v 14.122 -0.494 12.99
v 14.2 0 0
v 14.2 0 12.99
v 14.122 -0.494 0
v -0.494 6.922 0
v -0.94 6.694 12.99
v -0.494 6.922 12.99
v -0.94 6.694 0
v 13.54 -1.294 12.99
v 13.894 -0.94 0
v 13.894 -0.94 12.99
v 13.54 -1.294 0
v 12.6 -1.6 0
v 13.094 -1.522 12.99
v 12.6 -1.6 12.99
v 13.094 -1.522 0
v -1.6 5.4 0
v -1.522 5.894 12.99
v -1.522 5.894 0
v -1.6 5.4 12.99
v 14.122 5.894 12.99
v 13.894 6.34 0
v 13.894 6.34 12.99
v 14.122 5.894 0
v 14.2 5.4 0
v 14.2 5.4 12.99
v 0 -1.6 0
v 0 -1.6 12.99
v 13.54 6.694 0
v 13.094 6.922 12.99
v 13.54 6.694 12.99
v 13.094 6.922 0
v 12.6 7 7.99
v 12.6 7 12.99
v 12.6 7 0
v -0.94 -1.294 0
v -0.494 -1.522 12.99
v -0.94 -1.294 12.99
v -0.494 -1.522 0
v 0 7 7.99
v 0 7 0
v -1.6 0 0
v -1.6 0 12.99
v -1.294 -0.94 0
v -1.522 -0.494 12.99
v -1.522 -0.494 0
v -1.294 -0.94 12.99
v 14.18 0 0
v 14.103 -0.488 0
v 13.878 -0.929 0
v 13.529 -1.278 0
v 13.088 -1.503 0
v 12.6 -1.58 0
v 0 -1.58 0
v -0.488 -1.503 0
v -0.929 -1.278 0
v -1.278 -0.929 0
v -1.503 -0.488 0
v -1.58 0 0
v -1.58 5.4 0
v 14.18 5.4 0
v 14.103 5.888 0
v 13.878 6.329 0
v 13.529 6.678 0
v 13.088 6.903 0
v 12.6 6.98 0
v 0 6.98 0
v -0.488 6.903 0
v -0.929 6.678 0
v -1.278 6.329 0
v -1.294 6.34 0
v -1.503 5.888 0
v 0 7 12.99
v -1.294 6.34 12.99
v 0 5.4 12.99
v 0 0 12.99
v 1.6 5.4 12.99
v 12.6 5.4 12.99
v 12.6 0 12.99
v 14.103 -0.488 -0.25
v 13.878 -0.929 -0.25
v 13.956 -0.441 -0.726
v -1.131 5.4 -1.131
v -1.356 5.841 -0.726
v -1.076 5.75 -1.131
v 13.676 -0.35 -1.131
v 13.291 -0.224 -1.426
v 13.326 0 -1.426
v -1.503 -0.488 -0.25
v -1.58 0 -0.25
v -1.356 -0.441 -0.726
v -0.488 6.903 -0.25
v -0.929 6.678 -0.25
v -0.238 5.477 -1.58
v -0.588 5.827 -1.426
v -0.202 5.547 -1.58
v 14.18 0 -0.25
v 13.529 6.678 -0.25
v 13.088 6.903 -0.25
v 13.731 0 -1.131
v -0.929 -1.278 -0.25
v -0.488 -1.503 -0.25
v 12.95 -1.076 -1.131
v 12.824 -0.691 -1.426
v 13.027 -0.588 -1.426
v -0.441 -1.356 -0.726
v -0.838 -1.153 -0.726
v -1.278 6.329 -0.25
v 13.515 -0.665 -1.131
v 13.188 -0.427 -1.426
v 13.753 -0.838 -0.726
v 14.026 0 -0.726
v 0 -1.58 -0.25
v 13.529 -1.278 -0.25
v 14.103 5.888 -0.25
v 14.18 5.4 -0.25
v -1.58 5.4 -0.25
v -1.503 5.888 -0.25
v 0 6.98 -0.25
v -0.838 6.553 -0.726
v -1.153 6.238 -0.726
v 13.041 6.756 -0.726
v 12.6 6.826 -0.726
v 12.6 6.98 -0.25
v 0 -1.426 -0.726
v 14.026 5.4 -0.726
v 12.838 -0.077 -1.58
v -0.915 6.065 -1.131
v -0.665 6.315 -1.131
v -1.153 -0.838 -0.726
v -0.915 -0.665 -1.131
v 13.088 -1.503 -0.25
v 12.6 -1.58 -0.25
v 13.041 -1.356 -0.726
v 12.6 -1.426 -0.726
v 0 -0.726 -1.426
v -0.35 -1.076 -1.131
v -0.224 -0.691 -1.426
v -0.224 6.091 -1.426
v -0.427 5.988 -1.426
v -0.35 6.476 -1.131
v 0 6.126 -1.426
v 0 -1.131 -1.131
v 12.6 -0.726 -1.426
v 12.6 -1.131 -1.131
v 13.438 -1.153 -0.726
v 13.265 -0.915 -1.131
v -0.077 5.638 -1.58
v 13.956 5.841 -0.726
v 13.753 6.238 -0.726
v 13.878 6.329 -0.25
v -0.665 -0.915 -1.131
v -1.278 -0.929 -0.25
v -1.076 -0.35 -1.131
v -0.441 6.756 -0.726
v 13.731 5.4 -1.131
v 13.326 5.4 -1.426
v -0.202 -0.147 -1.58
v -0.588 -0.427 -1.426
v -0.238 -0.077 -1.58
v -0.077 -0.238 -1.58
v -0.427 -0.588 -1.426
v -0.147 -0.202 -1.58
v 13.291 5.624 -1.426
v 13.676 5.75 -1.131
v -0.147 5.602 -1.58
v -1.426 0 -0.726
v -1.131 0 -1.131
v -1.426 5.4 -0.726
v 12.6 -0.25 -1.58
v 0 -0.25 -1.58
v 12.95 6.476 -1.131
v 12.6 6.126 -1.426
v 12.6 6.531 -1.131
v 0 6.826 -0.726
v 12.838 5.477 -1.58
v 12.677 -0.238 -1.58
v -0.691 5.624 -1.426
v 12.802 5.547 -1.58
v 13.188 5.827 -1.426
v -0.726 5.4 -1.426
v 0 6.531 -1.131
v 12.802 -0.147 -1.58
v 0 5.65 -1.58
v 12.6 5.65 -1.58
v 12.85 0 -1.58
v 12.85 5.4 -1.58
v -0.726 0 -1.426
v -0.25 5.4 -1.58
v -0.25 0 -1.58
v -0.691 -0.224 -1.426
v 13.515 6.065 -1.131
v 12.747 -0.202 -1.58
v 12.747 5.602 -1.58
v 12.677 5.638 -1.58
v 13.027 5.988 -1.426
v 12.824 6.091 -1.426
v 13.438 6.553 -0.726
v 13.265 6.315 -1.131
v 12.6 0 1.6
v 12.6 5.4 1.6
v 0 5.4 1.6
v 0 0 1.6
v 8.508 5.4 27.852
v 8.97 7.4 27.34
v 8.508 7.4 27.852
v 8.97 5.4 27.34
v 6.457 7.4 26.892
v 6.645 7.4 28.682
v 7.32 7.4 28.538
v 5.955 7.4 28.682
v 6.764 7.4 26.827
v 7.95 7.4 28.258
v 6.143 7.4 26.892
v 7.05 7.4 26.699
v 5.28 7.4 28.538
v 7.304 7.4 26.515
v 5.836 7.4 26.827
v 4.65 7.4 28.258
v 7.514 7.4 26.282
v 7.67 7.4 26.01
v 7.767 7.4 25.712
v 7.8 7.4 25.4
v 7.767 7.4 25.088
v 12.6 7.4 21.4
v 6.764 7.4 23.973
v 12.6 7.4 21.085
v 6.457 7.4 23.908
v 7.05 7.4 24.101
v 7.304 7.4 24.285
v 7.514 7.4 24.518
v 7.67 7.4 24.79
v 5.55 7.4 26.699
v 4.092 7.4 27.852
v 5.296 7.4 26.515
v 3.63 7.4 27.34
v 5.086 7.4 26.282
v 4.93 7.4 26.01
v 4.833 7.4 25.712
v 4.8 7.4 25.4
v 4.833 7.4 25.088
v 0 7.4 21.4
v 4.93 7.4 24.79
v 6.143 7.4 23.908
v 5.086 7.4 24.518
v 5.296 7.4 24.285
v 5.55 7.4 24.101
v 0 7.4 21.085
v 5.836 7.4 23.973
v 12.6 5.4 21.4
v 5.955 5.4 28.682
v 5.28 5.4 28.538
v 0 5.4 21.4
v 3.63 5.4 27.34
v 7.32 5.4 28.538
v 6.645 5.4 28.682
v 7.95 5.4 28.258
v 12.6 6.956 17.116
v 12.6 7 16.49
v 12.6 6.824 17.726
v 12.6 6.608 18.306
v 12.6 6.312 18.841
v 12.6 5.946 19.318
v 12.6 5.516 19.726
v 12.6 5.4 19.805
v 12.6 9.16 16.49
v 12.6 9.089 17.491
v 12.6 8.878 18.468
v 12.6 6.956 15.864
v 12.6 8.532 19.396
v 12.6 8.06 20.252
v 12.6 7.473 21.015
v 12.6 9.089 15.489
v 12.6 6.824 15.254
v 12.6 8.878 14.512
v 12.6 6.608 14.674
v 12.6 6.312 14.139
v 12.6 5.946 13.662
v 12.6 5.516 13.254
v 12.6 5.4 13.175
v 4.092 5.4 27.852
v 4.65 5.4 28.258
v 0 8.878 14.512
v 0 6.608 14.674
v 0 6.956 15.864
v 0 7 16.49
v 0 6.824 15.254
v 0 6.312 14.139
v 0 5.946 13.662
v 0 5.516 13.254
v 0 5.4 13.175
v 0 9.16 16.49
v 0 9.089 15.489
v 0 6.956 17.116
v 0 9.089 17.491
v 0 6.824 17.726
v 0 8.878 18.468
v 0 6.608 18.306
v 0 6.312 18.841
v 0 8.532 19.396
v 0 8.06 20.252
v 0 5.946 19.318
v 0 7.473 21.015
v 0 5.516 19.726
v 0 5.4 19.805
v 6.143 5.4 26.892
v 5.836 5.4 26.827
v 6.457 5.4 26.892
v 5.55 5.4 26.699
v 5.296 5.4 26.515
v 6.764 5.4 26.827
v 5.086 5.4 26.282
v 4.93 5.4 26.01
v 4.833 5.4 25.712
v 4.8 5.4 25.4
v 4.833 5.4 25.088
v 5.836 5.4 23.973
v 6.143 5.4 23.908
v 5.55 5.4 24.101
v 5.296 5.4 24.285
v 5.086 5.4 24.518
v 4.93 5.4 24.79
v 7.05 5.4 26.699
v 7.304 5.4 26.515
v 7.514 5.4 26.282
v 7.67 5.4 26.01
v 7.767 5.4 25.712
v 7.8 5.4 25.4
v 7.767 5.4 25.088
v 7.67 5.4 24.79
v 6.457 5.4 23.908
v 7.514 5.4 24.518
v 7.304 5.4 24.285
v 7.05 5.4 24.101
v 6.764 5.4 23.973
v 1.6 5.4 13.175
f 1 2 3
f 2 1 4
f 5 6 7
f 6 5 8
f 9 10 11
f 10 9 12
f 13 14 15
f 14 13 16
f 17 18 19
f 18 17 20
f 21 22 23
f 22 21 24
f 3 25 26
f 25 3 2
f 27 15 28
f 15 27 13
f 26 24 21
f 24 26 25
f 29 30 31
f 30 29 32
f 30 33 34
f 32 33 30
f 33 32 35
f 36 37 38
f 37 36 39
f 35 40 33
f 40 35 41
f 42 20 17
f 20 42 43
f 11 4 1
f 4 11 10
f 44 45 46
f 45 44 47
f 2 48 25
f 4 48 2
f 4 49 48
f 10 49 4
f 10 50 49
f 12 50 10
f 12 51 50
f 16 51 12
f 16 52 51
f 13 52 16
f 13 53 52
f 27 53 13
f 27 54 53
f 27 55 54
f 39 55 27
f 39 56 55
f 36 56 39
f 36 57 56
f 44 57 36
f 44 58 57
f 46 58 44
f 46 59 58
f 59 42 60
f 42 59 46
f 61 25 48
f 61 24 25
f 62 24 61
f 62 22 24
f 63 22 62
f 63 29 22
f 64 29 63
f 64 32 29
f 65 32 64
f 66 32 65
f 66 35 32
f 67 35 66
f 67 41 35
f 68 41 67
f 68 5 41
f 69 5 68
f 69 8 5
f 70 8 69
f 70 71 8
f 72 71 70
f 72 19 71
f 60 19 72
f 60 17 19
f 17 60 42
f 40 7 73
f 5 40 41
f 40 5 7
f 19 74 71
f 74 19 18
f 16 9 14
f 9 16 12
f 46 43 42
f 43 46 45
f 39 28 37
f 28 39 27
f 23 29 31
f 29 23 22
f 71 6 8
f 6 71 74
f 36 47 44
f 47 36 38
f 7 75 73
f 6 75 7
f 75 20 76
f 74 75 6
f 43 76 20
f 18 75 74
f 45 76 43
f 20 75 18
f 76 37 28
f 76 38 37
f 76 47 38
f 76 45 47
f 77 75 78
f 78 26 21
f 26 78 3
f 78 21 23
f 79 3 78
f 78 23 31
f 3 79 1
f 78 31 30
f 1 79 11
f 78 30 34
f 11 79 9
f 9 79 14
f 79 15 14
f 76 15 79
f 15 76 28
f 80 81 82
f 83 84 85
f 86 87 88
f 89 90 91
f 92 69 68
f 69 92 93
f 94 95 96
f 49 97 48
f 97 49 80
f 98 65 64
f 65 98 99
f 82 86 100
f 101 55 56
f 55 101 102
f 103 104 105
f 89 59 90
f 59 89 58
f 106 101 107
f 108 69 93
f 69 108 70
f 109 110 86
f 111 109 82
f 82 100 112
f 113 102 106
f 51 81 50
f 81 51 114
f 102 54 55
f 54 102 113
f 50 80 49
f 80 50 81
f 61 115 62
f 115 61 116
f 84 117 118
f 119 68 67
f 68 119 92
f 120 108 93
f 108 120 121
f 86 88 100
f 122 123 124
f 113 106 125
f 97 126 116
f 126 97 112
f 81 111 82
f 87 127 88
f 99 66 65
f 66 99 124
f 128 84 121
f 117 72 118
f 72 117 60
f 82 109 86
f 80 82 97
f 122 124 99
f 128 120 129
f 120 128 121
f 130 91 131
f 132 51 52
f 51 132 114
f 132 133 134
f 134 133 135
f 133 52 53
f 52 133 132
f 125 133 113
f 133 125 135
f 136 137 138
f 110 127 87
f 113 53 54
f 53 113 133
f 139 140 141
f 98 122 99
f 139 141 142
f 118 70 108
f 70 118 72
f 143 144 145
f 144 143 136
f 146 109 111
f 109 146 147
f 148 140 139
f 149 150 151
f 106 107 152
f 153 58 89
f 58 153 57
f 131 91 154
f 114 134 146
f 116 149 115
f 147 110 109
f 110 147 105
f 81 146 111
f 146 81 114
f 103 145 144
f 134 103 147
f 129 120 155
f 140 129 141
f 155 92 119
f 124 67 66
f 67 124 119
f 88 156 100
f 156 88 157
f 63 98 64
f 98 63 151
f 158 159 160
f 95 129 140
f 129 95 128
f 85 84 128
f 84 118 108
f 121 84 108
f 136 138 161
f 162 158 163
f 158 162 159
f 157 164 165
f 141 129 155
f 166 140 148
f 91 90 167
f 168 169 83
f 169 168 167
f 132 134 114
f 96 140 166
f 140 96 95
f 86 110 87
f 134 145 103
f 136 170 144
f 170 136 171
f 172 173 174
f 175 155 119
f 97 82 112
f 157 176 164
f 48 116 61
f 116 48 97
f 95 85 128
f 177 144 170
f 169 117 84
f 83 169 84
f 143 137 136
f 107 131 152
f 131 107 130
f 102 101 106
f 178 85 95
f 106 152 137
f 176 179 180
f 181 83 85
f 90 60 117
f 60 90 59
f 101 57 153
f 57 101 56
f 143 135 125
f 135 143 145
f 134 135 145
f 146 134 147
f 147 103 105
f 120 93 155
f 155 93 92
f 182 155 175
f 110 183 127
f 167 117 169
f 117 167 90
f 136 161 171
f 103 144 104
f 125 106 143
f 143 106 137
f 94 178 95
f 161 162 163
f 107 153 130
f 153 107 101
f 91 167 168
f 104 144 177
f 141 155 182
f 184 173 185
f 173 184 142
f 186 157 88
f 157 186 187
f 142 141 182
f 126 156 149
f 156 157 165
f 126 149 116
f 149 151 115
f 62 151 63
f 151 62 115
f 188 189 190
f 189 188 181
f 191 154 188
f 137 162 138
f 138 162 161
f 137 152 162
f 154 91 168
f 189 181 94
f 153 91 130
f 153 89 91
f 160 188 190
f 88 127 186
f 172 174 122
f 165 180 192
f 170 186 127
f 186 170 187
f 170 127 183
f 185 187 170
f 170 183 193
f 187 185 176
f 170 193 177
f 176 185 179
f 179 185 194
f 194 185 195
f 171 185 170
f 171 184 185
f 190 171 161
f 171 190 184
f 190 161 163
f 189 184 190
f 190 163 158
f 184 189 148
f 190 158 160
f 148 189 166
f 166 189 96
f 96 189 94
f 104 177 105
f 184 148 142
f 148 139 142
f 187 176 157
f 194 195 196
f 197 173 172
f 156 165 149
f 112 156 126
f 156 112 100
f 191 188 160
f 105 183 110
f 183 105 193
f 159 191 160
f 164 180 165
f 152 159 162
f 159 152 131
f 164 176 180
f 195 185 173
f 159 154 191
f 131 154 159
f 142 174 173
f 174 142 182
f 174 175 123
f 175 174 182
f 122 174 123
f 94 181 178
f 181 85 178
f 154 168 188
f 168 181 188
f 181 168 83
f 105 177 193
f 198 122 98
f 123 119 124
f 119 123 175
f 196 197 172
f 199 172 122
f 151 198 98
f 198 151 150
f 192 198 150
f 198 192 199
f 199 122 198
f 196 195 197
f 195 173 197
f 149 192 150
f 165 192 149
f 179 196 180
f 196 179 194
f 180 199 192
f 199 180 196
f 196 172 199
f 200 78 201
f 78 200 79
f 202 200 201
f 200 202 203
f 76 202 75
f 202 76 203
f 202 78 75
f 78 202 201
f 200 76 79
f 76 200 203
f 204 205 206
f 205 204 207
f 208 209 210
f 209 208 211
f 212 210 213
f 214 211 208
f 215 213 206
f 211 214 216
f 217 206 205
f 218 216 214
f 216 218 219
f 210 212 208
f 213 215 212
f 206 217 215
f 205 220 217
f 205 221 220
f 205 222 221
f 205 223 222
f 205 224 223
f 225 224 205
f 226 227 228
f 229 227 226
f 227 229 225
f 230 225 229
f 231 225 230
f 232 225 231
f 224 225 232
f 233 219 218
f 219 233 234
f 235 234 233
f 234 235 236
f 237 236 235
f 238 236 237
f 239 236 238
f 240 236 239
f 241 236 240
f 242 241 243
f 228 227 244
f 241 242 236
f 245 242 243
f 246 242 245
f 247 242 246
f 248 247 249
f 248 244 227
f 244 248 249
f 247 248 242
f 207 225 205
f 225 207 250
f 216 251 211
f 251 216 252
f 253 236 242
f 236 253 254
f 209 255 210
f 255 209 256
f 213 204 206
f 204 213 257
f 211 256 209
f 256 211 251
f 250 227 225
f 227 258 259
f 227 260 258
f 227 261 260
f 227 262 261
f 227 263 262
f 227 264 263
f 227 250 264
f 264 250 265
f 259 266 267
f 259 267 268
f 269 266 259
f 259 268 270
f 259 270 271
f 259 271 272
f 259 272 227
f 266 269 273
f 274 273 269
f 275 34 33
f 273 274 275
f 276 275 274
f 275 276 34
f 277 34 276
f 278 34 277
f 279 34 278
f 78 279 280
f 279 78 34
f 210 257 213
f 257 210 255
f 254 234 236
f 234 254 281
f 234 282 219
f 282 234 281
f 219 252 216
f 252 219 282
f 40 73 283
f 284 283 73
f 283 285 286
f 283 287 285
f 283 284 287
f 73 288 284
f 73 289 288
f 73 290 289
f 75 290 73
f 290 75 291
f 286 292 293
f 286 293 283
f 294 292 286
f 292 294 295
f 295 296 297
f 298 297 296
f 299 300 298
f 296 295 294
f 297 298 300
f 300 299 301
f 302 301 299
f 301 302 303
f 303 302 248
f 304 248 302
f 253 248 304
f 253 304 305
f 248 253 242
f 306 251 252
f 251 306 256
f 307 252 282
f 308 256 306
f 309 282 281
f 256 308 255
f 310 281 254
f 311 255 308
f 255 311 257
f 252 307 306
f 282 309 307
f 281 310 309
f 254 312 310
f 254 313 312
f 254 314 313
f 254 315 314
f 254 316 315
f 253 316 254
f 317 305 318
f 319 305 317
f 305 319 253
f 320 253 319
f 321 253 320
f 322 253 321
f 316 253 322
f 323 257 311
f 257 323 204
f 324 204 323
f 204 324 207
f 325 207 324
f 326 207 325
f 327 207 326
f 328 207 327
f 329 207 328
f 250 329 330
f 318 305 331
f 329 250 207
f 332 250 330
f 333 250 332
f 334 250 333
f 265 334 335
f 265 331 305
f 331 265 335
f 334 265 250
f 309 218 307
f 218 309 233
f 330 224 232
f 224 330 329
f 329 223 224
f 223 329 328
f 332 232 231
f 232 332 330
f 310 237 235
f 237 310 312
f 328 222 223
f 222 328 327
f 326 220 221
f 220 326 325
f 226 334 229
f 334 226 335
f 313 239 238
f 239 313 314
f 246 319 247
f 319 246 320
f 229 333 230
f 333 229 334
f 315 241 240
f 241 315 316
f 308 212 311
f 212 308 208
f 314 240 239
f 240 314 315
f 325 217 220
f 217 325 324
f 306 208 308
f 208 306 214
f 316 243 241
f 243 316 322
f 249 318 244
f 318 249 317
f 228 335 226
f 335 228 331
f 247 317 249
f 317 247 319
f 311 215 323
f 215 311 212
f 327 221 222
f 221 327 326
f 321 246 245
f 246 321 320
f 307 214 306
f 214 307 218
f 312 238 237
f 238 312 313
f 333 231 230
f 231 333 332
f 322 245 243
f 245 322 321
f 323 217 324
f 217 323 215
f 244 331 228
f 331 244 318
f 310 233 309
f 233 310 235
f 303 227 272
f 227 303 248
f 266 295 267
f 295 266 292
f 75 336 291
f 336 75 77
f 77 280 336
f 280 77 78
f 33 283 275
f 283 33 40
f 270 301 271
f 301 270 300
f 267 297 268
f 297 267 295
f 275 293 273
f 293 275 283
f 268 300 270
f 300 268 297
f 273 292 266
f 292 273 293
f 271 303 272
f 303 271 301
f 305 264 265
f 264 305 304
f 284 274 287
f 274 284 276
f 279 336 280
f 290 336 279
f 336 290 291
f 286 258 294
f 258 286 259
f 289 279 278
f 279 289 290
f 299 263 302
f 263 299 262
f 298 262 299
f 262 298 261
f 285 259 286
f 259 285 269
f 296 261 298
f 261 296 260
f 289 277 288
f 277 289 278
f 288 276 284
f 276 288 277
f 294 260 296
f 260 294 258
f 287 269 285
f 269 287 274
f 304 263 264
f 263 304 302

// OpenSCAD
thick=1.6;
main_arr=[12.6,5.4,11.4];
difference() {
  minkowski() {
    cube(main_arr);
    union(){
    cylinder(r=thick,h=thick-.01,$fn=20);
    sphere(r=thick,$fn=20);
    }
  }
  translate([0,0,thick]) cube(main_arr);
}
*translate([main_arr[0]/2-3,0,main_arr[2]+thick-.01]) {
  cube([6,thick,10]);
  translate([0,0,8]) cube([6,thick+.5,2]);
}
translate([0,main_arr[1],main_arr[2]+9]) difference() {
  hull() {
    translate([0,0]) cube([main_arr[0],2,1]);
    translate([main_arr[0]/2,0,5]) rotate([-90,0]) cylinder(d=main_arr[0]-6,h=2,$fn=30);
  }translate([main_arr[0]/2,-.01,5]) rotate([-90,0]) cylinder(d=3,h=2.02,$fn=30);
  
}
translate([0,main_arr[1],main_arr[2]+thick-.01]) difference()
{
    hull() {
    intersection() {
      translate([0,0,-3]) cube([main_arr[0],7,11.2]);
      translate([-.01,-2,3.5]) rotate([0,90]) scale([1,.9]) cylinder(r=4+thick*1.5,h=main_arr[0]+thick*2+.02,$fn=40);
    }
      *translate([0,-2]) cube([main_arr[0]+thick*2,7,12]);
      translate([0,0,-5]) cube([main_arr[0],thick,2]);
    
    }
    translate([0,-main_arr[1]-thick,-main_arr[2]-thick]) translate([thick,thick,thick]) cube([main_arr[0],main_arr[1],main_arr[2]+2]);
    translate([-.01,-2,3.5]) rotate([0,90]) scale([1,.9]) cylinder(r=4,h=main_arr[0]+thick*2+.02,$fn=40);
}
